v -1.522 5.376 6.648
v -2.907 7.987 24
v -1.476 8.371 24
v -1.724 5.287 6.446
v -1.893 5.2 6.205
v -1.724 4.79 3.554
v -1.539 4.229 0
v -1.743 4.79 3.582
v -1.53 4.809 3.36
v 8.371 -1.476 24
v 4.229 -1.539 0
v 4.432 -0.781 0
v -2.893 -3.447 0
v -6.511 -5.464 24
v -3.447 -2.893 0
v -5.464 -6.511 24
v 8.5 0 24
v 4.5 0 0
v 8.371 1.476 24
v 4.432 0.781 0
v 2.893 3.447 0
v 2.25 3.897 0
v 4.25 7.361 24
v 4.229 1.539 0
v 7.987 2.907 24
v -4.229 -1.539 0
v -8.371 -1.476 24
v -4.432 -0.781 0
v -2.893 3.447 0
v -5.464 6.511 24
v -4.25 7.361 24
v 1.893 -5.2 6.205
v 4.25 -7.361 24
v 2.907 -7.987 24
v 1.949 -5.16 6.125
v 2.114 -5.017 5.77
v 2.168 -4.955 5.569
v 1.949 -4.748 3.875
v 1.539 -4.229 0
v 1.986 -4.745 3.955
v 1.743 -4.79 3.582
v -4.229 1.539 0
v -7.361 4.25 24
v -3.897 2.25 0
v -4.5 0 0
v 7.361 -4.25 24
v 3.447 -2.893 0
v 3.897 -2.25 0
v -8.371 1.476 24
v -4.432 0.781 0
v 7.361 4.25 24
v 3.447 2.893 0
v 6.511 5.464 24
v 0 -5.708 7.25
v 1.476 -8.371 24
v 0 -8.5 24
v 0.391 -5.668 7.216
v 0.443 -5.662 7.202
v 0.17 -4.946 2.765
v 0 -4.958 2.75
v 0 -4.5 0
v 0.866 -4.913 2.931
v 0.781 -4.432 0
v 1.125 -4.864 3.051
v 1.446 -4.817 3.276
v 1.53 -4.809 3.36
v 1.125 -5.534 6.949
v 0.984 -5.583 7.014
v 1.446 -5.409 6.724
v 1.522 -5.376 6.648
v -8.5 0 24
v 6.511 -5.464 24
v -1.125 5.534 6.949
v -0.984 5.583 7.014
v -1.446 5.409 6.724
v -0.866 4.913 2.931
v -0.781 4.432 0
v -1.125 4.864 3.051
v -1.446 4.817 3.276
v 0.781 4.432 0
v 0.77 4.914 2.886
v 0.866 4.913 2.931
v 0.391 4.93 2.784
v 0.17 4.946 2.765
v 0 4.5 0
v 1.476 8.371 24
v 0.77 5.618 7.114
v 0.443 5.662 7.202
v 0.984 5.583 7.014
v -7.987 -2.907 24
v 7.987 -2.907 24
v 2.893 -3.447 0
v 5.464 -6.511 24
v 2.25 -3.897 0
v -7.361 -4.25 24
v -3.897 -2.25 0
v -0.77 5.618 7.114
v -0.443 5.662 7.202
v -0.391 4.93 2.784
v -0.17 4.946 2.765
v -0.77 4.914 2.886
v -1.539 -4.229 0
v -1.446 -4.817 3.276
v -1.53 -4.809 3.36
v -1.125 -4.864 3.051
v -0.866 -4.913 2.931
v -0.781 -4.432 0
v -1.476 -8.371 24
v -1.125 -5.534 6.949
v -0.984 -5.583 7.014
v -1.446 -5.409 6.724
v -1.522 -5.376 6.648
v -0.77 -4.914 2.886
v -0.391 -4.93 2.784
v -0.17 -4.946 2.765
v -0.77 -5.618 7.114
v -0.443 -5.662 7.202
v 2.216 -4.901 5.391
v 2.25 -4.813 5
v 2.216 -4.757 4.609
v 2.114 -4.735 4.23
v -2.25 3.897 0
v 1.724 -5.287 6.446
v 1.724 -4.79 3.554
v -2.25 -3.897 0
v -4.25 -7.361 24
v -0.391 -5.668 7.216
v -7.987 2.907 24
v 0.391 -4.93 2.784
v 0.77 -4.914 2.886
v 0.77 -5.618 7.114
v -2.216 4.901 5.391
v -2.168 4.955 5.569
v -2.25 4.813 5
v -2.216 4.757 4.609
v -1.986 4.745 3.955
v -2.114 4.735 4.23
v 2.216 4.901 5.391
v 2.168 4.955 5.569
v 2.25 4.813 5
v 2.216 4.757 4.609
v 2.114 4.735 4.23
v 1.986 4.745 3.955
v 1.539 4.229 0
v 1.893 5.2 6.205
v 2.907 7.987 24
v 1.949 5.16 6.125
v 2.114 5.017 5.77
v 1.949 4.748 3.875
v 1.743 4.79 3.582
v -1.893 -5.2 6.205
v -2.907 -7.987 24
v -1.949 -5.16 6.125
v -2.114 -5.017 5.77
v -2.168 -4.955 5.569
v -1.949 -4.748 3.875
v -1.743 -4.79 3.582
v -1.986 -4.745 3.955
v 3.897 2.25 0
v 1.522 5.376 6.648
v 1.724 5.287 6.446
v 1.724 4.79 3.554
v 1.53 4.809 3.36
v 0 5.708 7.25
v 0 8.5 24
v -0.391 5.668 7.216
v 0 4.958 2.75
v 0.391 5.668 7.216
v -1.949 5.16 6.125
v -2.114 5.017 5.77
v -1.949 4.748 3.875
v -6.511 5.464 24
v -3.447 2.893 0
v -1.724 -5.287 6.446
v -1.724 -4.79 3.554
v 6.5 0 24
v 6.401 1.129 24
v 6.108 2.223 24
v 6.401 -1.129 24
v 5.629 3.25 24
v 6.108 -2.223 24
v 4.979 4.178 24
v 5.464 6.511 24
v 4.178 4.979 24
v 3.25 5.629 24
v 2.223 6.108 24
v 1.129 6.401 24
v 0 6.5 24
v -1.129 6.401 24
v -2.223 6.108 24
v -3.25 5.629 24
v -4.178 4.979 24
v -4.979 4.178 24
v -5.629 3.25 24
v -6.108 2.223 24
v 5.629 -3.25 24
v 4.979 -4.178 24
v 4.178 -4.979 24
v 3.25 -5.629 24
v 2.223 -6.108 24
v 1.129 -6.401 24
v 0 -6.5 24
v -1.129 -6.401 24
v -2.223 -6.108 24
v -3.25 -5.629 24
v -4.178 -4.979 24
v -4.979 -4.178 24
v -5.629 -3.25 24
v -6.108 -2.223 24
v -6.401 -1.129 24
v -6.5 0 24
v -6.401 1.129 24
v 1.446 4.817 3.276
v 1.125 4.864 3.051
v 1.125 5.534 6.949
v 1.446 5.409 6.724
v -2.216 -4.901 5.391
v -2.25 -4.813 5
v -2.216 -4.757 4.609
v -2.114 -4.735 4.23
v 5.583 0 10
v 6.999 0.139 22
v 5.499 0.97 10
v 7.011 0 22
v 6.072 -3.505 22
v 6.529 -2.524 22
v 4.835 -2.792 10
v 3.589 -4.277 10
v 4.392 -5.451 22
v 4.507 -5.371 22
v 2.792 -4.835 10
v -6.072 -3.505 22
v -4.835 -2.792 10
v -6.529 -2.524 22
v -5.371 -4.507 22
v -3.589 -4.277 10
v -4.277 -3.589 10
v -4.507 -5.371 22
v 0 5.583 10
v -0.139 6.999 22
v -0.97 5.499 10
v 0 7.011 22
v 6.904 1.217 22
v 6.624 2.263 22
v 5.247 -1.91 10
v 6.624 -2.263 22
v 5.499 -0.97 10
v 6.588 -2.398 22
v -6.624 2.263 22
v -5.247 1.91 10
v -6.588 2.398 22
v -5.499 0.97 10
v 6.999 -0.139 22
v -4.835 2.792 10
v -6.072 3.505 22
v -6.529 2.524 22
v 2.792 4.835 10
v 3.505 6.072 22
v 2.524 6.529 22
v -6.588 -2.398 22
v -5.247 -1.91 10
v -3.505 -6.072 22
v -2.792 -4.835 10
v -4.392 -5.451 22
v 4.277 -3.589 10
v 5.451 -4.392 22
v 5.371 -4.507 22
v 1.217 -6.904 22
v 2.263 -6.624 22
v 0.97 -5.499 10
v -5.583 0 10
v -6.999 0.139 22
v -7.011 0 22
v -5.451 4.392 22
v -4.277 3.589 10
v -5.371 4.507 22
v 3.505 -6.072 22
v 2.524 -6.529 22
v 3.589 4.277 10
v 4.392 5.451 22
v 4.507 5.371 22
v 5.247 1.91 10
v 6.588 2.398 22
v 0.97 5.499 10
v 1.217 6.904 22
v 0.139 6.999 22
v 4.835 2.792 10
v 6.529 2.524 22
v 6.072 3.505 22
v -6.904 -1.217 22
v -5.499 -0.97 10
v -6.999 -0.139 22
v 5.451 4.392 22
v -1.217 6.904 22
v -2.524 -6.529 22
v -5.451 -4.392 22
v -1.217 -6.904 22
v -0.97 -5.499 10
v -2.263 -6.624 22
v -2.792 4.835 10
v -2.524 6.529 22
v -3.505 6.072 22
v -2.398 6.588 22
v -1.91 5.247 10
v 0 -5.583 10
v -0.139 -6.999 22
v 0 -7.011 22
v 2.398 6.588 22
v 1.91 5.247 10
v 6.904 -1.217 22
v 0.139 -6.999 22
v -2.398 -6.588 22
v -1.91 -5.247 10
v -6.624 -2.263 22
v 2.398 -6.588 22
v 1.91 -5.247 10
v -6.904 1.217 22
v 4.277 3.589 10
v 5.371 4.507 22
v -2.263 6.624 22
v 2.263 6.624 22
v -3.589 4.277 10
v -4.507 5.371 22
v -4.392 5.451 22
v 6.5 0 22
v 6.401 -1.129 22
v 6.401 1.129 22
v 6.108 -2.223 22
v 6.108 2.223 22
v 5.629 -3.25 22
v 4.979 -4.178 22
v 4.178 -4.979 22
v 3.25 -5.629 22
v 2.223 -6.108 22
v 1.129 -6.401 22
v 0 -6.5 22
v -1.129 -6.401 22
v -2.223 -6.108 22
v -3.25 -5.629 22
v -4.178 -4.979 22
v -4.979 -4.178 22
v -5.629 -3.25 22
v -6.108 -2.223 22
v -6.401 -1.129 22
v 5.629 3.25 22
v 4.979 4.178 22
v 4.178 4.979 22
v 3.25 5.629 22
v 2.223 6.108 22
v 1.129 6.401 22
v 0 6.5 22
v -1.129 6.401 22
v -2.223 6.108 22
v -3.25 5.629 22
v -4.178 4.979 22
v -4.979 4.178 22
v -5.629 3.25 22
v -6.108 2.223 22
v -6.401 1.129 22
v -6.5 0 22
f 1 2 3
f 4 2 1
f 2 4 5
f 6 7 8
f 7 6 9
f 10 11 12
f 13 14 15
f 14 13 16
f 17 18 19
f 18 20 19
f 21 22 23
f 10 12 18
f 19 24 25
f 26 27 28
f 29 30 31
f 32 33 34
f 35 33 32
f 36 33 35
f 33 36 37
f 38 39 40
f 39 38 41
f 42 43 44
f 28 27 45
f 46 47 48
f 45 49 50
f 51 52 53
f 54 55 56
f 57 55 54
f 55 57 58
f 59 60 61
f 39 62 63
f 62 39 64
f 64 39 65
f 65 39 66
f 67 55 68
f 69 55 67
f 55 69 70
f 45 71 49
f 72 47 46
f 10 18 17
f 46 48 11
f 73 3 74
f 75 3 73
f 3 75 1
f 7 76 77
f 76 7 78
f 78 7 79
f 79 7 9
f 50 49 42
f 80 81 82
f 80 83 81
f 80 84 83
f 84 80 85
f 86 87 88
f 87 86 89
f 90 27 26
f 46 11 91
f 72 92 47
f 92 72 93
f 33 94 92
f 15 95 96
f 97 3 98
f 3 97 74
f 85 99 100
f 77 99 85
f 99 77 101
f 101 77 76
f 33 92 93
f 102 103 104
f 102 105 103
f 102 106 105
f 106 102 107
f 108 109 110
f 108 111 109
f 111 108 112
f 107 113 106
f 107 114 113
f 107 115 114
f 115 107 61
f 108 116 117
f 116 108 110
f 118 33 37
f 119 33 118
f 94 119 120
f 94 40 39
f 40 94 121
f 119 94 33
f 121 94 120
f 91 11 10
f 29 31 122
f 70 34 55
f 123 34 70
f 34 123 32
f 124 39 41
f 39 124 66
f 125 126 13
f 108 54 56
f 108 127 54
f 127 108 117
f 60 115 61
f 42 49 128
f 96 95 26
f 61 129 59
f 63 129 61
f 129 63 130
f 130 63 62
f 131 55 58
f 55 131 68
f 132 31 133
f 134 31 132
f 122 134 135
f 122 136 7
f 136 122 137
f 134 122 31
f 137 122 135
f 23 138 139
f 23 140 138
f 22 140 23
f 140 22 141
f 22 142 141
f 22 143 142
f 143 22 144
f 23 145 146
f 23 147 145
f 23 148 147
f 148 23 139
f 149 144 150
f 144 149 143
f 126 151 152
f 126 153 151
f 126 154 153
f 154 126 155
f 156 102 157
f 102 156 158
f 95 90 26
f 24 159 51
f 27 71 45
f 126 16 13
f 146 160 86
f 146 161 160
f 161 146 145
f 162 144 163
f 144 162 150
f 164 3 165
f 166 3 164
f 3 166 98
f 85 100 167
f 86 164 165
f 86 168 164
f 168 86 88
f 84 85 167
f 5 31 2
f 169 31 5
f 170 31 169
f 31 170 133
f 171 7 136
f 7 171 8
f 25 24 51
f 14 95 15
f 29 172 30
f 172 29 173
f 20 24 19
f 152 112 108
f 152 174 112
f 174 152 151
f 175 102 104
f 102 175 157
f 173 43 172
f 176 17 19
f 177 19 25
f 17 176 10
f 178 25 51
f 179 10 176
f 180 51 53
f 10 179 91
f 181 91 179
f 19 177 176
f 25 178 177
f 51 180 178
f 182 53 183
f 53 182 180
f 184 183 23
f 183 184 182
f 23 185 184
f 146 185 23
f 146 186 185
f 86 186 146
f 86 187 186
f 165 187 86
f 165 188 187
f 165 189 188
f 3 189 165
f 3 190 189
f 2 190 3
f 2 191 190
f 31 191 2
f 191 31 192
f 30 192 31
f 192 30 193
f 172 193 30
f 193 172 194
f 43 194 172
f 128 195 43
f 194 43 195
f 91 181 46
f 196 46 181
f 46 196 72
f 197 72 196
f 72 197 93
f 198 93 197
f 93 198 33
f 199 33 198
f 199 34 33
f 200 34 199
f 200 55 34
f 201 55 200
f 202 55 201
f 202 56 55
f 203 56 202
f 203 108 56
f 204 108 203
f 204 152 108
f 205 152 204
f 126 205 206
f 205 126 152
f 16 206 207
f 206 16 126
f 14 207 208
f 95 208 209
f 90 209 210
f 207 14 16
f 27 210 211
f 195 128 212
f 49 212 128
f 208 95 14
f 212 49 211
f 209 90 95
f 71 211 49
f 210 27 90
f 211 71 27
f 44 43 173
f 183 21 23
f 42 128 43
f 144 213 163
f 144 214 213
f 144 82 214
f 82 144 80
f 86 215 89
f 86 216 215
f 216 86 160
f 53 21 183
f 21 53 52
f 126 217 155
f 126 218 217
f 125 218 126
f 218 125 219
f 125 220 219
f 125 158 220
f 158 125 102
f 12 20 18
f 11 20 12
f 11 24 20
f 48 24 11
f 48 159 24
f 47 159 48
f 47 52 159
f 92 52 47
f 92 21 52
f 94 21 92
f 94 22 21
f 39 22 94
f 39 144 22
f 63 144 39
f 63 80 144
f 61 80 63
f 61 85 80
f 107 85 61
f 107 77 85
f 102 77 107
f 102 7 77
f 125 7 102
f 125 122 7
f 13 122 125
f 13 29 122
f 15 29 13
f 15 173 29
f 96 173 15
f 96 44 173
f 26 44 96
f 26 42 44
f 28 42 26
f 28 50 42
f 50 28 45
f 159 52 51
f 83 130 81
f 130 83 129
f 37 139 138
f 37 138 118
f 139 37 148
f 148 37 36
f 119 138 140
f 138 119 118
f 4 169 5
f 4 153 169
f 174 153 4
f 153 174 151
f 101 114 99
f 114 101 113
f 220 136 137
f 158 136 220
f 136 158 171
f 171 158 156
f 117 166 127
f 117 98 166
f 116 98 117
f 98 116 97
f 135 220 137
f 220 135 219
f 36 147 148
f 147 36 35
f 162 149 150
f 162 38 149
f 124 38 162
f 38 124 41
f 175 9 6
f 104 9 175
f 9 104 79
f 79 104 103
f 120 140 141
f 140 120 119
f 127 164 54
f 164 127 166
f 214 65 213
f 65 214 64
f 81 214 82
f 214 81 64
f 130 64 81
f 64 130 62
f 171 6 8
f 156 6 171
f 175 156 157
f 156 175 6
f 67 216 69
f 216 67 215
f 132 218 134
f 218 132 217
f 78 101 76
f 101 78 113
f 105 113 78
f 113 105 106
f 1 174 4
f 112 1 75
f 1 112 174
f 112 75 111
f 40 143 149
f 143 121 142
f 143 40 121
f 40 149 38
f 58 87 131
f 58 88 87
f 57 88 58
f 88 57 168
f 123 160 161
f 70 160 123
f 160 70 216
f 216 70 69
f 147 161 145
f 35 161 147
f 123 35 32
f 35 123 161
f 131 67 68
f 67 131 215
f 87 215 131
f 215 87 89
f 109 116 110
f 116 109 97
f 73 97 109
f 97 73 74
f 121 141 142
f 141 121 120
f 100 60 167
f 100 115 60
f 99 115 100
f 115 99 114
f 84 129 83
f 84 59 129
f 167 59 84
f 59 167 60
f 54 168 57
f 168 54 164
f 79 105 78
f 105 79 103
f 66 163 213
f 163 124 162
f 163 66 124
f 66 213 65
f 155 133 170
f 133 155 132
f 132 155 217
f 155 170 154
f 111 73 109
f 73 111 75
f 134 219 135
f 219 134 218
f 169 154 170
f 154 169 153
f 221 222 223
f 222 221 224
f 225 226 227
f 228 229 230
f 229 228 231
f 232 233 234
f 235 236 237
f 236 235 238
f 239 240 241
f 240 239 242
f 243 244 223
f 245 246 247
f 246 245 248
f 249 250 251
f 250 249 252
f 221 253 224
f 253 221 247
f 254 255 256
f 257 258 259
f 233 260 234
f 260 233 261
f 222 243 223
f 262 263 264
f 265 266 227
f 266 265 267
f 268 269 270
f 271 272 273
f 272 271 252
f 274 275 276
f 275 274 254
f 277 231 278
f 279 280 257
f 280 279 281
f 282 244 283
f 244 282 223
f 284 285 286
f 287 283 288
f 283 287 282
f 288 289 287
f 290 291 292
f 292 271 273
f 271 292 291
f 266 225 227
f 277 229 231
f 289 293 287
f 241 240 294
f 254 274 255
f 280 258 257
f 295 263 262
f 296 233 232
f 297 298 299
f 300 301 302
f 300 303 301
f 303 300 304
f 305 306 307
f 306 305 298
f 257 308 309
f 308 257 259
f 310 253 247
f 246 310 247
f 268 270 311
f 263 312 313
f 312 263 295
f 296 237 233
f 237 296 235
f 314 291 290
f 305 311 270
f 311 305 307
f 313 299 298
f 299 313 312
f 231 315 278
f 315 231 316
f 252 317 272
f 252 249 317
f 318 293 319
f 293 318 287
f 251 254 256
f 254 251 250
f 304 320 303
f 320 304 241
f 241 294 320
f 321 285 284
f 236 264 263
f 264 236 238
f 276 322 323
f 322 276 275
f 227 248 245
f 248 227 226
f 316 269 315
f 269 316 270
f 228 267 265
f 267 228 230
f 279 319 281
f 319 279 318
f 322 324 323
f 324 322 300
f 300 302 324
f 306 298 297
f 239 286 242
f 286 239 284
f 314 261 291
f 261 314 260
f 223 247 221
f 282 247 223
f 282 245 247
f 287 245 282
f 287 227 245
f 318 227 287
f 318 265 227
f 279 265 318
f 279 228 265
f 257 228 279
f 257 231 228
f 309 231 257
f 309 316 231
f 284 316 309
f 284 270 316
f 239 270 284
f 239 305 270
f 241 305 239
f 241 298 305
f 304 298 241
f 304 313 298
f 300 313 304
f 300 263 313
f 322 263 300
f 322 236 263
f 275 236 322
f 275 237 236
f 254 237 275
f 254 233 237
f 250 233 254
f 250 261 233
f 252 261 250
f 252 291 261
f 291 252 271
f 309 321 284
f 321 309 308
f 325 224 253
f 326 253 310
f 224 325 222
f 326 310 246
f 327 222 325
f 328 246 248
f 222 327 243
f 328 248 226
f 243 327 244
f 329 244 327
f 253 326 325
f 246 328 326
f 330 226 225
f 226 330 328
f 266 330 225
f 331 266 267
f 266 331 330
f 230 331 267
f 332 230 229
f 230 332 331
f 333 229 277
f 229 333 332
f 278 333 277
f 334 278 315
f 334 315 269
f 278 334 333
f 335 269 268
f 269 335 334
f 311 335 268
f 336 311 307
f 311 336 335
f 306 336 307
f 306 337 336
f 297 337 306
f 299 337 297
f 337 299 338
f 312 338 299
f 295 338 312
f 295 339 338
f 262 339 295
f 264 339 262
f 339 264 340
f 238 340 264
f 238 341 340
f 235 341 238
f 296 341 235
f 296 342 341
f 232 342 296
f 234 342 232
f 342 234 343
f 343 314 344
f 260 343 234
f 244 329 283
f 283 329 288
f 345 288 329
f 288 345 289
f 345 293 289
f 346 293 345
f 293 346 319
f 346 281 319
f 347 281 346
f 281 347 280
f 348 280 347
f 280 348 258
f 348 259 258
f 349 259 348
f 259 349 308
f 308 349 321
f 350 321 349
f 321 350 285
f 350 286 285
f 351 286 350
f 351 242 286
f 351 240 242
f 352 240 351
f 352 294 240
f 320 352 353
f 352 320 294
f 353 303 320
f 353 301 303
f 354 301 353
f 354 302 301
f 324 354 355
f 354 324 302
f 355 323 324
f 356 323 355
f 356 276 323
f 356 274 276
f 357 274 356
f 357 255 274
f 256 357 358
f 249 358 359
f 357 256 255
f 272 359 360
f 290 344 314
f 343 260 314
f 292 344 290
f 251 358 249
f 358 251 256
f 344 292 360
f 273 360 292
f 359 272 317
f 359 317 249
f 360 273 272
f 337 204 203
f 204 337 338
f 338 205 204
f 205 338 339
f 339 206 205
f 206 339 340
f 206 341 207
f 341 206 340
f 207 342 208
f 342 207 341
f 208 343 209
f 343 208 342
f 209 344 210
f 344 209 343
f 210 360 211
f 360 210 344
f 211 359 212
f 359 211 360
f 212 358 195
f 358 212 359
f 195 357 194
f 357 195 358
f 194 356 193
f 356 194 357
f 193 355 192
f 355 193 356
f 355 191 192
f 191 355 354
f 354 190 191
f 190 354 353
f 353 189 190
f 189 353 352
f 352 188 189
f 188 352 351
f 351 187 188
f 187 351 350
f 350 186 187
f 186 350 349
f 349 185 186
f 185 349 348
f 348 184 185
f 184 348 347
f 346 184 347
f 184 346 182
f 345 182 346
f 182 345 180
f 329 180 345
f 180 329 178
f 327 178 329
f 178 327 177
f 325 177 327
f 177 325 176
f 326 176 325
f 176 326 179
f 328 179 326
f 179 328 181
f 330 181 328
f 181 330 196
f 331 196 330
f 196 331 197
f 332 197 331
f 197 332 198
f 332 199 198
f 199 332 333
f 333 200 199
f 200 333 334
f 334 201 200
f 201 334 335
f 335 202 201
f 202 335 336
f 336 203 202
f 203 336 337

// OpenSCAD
bottomWidth = 17;
wall = 1.25;
topWidth = 9;
height = 24;
filledSection = 10;
hole = 4.5;
lip = 0.75;
lipHeight = 2;

$fn = 36;

t = filledSection / height;

difference() {
    cylinder(d1=topWidth, d2=bottomWidth, h=height);
    translate([0,0,filledSection/2]) rotate([90,0,0]) cylinder(d=hole, h=bottomWidth*2, center=true);
    translate([0,0,filledSection]) cylinder(d2=bottomWidth-2*wall, h=height-filledSection+.01, d1=topWidth * t + bottomWidth * (1-t) - 2*wall);
}

translate([0,0,height-lipHeight])
linear_extrude(height=lipHeight) {
    difference() {
        circle(d=bottomWidth-2*wall+.01);
        circle(d=bottomWidth-2*wall-2*lip);
    }
}
